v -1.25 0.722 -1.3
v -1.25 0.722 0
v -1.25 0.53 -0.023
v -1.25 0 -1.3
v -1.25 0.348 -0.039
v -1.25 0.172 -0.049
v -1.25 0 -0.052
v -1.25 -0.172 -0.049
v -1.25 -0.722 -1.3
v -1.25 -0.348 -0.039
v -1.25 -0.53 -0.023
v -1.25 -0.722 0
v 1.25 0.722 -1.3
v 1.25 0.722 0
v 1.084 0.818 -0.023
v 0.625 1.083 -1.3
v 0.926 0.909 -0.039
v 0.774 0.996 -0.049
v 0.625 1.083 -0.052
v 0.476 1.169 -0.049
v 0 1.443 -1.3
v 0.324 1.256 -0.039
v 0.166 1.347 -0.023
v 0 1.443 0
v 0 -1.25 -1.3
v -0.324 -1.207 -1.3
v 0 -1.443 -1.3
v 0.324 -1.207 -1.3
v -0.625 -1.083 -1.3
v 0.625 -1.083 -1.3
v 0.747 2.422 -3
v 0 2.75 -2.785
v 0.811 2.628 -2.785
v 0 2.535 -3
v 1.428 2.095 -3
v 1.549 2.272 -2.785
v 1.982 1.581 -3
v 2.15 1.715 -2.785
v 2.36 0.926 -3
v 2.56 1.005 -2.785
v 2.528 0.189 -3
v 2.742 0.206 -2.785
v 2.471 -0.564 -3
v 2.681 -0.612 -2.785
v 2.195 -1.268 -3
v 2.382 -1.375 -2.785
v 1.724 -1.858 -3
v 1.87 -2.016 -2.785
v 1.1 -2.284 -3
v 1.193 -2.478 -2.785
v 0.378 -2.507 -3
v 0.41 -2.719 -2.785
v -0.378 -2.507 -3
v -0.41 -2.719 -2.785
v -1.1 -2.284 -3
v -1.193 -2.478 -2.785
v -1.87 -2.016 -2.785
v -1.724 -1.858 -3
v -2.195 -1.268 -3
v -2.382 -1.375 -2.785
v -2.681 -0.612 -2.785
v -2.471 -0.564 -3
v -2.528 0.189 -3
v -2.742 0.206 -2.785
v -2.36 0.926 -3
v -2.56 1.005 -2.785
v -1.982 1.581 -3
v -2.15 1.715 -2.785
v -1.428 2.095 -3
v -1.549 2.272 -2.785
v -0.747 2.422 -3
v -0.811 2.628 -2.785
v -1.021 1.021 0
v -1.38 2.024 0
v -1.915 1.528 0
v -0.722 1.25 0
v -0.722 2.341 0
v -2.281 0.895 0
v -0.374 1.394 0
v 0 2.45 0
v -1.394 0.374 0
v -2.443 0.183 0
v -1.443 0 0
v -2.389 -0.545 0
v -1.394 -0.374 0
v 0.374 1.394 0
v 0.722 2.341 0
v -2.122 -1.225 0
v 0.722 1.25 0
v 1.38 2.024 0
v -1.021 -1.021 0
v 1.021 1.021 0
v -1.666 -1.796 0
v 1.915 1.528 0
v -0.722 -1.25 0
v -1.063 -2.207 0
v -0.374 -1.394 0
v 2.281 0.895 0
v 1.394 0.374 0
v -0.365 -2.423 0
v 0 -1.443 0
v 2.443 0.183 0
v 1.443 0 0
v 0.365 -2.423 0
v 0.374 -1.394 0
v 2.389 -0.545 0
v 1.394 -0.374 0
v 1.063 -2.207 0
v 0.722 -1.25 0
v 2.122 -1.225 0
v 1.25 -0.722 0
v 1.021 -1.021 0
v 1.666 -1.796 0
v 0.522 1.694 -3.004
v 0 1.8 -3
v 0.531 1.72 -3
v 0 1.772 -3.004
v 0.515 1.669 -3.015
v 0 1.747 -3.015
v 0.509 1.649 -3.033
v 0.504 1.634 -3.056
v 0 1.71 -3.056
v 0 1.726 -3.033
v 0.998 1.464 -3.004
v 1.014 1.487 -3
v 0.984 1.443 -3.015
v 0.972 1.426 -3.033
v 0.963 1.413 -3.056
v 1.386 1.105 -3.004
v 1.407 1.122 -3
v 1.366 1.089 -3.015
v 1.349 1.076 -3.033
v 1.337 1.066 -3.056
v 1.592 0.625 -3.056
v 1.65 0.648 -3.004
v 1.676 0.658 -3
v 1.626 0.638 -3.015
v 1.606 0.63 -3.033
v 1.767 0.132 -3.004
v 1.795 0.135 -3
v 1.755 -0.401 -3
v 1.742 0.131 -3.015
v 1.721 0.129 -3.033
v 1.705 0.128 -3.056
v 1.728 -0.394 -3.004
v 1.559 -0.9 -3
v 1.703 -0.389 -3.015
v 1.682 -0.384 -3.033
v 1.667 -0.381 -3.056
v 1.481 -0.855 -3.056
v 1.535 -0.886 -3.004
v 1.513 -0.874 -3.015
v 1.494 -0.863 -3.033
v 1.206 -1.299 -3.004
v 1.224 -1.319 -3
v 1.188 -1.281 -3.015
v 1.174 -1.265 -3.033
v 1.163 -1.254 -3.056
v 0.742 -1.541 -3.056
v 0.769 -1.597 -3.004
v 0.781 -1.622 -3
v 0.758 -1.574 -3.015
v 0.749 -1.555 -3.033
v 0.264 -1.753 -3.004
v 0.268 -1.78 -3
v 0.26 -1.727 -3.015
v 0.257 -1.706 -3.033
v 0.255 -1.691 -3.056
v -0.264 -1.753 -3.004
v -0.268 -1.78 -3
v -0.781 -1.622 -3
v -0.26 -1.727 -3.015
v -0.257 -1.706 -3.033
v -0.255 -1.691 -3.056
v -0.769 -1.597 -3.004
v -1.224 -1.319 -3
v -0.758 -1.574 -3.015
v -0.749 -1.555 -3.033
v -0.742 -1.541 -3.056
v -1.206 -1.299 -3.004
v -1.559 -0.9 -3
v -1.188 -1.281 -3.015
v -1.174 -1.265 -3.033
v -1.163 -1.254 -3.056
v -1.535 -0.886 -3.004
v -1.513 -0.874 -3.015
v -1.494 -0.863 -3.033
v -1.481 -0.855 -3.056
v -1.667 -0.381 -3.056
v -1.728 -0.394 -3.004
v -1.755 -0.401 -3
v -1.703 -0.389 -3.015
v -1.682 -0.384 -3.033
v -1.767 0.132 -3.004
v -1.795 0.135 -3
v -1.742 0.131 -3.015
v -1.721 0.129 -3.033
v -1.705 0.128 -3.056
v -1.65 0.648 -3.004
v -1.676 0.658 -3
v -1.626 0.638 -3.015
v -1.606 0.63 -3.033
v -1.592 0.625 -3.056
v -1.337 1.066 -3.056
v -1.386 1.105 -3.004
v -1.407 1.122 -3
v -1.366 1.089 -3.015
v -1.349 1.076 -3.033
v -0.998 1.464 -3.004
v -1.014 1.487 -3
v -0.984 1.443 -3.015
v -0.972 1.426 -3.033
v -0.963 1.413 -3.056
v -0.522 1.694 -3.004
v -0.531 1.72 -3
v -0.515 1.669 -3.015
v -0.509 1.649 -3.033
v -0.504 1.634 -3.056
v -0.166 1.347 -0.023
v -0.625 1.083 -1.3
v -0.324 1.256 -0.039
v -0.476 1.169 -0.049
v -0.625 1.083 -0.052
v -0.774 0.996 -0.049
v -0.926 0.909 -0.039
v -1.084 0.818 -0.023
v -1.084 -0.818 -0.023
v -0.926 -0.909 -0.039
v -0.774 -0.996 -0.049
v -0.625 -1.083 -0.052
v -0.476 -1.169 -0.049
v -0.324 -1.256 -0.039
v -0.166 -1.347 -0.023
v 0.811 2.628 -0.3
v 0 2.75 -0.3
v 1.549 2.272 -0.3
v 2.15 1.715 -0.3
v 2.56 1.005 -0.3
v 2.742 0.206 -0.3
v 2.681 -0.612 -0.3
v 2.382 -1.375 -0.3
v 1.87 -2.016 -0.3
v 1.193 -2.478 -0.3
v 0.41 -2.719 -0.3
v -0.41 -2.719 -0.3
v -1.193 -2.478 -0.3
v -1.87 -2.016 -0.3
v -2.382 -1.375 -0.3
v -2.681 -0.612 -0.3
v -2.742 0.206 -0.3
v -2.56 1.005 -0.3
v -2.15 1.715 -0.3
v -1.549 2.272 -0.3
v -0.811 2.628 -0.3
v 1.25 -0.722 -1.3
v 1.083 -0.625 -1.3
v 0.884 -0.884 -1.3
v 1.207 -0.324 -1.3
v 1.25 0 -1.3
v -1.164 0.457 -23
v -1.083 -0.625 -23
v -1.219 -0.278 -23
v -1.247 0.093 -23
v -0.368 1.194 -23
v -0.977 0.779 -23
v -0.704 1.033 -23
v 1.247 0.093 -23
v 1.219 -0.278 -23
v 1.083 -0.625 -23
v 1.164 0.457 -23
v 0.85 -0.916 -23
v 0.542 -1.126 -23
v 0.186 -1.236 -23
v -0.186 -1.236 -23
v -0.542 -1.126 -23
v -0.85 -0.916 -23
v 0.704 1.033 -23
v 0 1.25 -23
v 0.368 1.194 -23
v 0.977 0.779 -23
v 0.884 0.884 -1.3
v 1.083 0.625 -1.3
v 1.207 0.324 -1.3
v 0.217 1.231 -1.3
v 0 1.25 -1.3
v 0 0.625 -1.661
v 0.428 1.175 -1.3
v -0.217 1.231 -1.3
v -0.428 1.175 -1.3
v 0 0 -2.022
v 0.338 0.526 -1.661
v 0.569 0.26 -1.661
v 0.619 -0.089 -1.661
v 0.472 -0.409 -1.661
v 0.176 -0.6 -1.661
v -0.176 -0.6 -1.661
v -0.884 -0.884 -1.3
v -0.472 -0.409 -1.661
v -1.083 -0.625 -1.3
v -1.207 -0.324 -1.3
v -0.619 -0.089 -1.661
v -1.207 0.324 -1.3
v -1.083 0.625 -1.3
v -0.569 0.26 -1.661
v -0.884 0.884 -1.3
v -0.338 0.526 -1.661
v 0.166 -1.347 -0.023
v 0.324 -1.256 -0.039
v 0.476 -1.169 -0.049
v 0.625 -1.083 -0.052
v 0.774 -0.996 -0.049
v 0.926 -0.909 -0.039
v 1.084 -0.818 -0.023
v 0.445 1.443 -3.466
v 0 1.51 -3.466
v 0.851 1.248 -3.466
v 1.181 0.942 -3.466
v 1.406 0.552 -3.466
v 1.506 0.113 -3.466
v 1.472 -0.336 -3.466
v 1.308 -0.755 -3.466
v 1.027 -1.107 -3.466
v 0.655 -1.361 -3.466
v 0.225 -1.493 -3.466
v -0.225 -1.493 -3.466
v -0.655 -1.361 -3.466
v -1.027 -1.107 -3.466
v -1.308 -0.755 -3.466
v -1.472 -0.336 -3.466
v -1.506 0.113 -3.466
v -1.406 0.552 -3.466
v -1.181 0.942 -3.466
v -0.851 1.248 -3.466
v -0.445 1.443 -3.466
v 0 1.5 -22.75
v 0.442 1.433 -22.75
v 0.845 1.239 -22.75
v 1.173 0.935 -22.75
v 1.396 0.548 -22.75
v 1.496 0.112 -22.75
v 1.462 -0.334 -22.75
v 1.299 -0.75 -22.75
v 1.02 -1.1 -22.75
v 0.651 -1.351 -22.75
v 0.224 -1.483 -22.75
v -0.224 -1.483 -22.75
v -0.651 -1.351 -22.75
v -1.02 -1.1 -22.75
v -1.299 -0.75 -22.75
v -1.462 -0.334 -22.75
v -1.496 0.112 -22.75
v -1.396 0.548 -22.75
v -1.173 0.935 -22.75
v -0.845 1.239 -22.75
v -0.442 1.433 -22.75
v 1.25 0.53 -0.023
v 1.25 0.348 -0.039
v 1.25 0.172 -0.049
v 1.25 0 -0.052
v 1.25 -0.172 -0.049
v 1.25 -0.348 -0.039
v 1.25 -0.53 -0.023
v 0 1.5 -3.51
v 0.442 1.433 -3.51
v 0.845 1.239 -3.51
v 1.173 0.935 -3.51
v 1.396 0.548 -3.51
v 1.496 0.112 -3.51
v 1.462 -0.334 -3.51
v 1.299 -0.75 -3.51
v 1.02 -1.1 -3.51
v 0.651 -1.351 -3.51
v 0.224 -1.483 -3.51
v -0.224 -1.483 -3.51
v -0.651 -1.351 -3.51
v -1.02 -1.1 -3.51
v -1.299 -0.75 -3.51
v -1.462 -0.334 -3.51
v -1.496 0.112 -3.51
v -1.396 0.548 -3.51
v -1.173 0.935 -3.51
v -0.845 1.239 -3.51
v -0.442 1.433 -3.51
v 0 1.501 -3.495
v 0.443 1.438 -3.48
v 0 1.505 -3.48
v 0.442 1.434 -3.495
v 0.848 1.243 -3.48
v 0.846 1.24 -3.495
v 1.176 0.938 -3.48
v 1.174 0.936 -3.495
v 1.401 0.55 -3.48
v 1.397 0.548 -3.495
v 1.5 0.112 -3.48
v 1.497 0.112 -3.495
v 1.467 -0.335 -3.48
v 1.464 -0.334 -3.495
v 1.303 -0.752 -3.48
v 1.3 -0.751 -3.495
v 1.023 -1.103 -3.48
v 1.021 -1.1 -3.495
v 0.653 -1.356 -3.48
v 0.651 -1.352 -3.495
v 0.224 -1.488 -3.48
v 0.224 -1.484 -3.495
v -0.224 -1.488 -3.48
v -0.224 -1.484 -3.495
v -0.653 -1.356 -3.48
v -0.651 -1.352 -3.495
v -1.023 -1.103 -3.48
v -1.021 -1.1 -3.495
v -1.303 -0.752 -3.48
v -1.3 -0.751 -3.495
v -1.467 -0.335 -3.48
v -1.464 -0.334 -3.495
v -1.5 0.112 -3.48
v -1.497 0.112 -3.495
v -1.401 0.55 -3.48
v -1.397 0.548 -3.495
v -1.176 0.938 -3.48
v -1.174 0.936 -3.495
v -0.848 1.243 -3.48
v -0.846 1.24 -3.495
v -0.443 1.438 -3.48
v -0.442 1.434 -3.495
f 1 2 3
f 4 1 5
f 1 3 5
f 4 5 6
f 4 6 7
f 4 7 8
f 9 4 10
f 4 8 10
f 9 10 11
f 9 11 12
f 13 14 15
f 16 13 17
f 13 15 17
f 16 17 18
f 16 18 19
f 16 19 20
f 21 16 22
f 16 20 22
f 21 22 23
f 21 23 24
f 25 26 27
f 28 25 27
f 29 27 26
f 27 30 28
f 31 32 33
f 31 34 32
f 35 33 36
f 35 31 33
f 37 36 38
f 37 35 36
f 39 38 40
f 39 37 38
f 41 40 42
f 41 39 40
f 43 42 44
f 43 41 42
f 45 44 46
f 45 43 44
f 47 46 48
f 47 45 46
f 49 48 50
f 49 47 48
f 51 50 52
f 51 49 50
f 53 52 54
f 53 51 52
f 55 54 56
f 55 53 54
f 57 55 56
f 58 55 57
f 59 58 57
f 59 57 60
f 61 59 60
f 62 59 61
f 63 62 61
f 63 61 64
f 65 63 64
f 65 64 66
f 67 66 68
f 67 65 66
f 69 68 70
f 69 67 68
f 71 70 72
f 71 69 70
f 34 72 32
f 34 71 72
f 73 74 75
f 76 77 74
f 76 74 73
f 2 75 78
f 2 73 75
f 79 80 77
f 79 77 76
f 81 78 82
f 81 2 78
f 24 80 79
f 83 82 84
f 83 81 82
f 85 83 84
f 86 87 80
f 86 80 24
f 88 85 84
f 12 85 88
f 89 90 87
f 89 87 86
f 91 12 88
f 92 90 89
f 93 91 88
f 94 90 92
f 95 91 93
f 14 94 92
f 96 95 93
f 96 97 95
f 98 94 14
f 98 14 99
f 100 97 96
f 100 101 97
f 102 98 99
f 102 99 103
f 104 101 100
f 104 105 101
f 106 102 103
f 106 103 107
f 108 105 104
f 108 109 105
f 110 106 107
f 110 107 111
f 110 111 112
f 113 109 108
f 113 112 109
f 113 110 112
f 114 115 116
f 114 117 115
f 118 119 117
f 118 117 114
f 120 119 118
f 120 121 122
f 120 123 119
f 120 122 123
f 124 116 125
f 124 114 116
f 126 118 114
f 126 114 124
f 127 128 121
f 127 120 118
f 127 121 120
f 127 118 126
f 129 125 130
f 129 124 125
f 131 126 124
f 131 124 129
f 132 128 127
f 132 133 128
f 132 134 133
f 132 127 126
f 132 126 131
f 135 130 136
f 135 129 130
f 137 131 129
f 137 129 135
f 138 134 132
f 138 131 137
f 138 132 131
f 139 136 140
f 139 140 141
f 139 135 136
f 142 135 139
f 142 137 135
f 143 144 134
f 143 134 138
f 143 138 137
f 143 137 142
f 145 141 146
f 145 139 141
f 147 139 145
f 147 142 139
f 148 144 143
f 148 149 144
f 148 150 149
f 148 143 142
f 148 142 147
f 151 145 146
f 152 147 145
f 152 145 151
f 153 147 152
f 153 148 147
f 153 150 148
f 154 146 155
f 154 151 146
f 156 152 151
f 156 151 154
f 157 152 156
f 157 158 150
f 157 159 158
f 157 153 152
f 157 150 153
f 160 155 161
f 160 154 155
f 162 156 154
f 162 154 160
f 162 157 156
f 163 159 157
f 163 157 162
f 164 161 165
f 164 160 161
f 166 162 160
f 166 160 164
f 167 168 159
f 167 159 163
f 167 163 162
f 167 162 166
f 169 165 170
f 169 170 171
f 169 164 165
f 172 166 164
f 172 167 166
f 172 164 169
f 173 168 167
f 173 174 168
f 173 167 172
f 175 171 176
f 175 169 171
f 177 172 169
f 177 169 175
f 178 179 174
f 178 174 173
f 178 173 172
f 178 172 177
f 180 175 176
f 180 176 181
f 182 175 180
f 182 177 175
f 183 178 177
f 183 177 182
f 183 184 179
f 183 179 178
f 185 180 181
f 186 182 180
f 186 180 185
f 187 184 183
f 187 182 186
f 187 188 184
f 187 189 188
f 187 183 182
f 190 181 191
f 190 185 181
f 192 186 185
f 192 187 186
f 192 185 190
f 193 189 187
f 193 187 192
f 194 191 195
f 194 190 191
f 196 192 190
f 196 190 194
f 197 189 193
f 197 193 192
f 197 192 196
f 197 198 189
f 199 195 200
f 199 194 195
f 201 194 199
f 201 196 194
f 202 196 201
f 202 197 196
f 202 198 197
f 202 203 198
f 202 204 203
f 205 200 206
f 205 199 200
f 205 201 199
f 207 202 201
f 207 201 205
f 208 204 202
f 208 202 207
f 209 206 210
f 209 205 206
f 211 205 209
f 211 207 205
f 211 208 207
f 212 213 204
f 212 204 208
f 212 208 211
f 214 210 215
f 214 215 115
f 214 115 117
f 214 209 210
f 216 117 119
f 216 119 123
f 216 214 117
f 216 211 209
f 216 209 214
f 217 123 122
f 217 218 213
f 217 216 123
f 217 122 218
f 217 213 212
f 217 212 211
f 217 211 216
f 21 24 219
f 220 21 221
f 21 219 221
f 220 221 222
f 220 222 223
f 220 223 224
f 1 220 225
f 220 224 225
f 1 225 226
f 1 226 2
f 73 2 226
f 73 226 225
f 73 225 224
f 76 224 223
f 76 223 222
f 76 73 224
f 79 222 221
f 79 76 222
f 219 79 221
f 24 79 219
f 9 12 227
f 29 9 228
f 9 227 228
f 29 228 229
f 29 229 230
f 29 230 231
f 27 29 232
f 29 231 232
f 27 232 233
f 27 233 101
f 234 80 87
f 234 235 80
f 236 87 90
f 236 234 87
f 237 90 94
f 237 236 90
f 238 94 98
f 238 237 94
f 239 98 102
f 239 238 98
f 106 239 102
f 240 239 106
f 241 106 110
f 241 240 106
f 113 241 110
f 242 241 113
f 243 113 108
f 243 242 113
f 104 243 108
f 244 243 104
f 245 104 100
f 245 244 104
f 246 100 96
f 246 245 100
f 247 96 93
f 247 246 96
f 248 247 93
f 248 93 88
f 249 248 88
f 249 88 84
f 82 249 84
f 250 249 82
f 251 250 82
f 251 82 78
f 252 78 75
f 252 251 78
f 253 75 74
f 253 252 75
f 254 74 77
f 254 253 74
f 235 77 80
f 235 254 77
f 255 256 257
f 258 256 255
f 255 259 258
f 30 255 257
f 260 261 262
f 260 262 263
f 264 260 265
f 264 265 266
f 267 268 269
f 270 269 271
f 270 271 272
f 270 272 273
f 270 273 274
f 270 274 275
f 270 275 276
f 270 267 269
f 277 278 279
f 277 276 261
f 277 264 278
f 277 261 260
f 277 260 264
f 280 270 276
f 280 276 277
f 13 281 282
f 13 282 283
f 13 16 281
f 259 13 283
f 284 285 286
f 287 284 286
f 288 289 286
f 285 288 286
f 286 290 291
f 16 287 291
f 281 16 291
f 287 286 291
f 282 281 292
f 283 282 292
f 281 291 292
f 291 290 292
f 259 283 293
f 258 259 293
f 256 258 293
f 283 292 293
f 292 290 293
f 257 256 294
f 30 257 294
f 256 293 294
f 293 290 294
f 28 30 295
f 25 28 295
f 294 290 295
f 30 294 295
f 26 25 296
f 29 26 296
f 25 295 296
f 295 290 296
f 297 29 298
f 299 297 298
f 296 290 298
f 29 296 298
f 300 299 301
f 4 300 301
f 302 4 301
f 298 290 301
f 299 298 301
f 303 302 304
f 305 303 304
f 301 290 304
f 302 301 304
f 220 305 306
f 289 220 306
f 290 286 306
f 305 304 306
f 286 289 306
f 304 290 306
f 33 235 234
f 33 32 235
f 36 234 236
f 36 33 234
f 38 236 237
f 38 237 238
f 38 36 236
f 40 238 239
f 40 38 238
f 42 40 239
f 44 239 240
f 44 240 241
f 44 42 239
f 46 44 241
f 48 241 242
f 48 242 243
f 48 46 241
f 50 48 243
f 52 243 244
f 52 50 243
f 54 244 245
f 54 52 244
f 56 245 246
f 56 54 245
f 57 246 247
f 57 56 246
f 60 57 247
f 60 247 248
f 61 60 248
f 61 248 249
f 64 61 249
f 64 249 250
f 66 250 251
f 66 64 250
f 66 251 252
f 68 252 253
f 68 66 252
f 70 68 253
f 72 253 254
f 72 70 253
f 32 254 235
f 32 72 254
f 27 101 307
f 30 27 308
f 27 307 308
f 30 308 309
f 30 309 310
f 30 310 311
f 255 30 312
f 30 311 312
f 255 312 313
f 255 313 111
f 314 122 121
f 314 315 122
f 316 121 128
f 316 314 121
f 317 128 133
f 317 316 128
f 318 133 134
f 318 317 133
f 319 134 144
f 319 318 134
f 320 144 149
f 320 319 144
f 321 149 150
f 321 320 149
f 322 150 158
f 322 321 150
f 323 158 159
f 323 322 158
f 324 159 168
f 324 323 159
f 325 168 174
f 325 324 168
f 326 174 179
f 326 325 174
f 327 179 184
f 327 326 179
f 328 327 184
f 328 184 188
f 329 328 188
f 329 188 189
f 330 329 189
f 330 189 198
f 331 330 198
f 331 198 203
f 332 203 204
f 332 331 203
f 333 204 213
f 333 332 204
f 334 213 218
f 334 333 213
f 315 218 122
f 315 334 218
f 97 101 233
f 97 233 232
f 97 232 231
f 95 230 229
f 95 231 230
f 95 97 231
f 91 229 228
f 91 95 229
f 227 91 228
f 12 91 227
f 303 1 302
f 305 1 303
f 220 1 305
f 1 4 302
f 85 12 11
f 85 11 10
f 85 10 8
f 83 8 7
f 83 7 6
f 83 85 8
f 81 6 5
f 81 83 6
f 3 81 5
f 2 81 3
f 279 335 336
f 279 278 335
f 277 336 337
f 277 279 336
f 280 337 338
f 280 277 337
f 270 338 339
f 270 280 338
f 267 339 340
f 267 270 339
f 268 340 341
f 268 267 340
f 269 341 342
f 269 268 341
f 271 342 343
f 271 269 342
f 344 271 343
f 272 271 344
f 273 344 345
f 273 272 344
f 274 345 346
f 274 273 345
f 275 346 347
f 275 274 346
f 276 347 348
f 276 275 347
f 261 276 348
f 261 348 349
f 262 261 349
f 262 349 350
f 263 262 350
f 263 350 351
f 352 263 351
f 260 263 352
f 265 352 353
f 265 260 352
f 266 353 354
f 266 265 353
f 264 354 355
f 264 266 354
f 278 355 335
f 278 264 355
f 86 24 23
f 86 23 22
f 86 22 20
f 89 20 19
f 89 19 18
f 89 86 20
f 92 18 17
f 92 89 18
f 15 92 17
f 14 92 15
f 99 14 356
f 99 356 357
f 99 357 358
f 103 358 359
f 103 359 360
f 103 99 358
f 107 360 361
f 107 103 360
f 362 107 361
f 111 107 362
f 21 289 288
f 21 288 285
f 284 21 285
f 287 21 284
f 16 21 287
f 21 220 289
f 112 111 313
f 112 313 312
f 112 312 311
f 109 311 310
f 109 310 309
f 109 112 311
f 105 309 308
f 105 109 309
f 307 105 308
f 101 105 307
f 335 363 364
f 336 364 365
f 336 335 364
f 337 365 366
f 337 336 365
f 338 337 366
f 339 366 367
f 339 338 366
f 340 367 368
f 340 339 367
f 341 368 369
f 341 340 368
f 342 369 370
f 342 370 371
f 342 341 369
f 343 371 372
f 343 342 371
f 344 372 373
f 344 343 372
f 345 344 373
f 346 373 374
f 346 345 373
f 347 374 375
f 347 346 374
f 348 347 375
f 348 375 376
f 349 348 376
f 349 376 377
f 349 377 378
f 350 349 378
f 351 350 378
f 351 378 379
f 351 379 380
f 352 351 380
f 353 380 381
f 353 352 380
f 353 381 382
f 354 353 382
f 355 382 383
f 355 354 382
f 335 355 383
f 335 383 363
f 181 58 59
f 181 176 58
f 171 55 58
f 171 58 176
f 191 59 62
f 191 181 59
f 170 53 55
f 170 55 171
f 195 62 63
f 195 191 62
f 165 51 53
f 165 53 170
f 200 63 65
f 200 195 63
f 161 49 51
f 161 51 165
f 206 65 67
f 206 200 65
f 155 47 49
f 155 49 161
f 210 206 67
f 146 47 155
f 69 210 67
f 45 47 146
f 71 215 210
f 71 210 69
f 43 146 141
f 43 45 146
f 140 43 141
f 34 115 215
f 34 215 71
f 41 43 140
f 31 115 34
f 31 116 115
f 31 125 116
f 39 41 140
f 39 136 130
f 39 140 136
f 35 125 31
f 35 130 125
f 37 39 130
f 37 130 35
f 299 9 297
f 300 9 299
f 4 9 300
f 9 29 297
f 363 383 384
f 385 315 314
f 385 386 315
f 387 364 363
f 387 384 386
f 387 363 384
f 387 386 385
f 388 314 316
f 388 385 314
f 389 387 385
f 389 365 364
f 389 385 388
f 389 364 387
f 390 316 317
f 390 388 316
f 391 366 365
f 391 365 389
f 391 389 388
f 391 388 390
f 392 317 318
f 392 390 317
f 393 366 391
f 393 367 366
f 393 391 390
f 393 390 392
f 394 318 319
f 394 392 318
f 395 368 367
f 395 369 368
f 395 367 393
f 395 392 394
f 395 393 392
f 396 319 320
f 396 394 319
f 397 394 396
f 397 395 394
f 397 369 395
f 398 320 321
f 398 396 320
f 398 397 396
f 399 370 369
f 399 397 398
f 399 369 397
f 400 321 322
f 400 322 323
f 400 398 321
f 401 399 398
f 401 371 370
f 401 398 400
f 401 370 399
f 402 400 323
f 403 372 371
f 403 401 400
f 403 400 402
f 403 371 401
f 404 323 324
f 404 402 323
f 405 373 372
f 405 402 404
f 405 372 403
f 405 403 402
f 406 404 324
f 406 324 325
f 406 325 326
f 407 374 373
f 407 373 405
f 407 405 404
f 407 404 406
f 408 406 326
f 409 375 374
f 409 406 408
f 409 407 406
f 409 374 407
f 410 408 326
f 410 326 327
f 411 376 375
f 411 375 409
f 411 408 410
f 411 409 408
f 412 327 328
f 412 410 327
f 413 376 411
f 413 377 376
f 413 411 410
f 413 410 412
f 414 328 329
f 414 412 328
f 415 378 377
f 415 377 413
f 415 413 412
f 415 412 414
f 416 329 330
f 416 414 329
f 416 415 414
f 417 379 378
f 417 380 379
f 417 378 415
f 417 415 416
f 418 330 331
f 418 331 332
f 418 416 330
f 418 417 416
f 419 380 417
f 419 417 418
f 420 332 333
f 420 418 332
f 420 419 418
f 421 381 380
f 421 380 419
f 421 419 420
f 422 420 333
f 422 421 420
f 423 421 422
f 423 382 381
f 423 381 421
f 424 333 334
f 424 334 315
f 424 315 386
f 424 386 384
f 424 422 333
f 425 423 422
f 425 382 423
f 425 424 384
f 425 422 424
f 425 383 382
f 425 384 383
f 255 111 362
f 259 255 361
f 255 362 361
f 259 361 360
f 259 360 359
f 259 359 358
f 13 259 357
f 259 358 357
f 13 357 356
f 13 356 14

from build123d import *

# Parameters (mm, degrees)
CUT_EXTRUDE1_DEPTH = 1.3


with BuildPart() as part:
    # Sketch1 → Revolve1 (revolve)
    with BuildSketch(Plane(origin=(0, 0, 0), x_dir=(0, 0, -1), z_dir=(1, 0, 0))):
        with BuildLine():
            Line((0, 0), (0, 2.45))
            Line((0, 2.45), (0.3, 2.75))
            Line((0.3, 2.75), (2.785, 2.75))
            Line((2.785, 2.75), (3, 2.535))
            Line((3, 2.535), (3, 1.8))
            ThreePointArc((3, 1.8), (3.015193643, 1.74701055), (3.056157637, 1.710123155))
            Line((3.056157637, 1.710123155), (3.466157637, 1.510123155))
            ThreePointArc((3.466157637, 1.510123155), (3.48750205, 1.50256365), (3.51, 1.5))
            Line((3.51, 1.5), (22.75, 1.5))
            Line((22.75, 1.5), (23, 1.25))
            Line((23, 1.25), (23, 0))
            Line((23, 0), (0, 0))
        make_face()
    revolve(axis=Axis((0, 0, 0), (0, 0, -1)))

    # Sketch2 → Cut-Extrude1 (cut)
    with BuildSketch(Plane.XY):
        Polygon((0, 1.443375673), (-1.25, 0.721687836), (-1.25, -0.721687836), (0, -1.443375673), (1.25, -0.721687836), (1.25, 0.721687836), align=None)
    extrude(amount=-CUT_EXTRUDE1_DEPTH, mode=Mode.SUBTRACT)

    # Sketch3 → Cut-Revolve2 (revolve, cut)
    with BuildSketch(Plane(origin=(0, 0, 0), x_dir=(0, 0, -1), z_dir=(1, 0, 0))):
        Polygon((1.3, 0), (1.3, 1.25), (2.021687836, 0), align=None)
    revolve(axis=Axis((0, 0, -1.3), (0, 0, -1)), mode=Mode.SUBTRACT)

    # Sketch4 → Cut-Revolve3 (revolve, cut)
    with BuildSketch(Plane(origin=(0, 0, 0), x_dir=(0, 0, -1), z_dir=(1, 0, 0))):
        Polygon((0, 1.443375673), (0, 1.25), (0.051814855, 1.25), align=None)
    revolve(axis=Axis((0, 0, 0), (0, 0, -1)), mode=Mode.SUBTRACT)


solid = part.part
